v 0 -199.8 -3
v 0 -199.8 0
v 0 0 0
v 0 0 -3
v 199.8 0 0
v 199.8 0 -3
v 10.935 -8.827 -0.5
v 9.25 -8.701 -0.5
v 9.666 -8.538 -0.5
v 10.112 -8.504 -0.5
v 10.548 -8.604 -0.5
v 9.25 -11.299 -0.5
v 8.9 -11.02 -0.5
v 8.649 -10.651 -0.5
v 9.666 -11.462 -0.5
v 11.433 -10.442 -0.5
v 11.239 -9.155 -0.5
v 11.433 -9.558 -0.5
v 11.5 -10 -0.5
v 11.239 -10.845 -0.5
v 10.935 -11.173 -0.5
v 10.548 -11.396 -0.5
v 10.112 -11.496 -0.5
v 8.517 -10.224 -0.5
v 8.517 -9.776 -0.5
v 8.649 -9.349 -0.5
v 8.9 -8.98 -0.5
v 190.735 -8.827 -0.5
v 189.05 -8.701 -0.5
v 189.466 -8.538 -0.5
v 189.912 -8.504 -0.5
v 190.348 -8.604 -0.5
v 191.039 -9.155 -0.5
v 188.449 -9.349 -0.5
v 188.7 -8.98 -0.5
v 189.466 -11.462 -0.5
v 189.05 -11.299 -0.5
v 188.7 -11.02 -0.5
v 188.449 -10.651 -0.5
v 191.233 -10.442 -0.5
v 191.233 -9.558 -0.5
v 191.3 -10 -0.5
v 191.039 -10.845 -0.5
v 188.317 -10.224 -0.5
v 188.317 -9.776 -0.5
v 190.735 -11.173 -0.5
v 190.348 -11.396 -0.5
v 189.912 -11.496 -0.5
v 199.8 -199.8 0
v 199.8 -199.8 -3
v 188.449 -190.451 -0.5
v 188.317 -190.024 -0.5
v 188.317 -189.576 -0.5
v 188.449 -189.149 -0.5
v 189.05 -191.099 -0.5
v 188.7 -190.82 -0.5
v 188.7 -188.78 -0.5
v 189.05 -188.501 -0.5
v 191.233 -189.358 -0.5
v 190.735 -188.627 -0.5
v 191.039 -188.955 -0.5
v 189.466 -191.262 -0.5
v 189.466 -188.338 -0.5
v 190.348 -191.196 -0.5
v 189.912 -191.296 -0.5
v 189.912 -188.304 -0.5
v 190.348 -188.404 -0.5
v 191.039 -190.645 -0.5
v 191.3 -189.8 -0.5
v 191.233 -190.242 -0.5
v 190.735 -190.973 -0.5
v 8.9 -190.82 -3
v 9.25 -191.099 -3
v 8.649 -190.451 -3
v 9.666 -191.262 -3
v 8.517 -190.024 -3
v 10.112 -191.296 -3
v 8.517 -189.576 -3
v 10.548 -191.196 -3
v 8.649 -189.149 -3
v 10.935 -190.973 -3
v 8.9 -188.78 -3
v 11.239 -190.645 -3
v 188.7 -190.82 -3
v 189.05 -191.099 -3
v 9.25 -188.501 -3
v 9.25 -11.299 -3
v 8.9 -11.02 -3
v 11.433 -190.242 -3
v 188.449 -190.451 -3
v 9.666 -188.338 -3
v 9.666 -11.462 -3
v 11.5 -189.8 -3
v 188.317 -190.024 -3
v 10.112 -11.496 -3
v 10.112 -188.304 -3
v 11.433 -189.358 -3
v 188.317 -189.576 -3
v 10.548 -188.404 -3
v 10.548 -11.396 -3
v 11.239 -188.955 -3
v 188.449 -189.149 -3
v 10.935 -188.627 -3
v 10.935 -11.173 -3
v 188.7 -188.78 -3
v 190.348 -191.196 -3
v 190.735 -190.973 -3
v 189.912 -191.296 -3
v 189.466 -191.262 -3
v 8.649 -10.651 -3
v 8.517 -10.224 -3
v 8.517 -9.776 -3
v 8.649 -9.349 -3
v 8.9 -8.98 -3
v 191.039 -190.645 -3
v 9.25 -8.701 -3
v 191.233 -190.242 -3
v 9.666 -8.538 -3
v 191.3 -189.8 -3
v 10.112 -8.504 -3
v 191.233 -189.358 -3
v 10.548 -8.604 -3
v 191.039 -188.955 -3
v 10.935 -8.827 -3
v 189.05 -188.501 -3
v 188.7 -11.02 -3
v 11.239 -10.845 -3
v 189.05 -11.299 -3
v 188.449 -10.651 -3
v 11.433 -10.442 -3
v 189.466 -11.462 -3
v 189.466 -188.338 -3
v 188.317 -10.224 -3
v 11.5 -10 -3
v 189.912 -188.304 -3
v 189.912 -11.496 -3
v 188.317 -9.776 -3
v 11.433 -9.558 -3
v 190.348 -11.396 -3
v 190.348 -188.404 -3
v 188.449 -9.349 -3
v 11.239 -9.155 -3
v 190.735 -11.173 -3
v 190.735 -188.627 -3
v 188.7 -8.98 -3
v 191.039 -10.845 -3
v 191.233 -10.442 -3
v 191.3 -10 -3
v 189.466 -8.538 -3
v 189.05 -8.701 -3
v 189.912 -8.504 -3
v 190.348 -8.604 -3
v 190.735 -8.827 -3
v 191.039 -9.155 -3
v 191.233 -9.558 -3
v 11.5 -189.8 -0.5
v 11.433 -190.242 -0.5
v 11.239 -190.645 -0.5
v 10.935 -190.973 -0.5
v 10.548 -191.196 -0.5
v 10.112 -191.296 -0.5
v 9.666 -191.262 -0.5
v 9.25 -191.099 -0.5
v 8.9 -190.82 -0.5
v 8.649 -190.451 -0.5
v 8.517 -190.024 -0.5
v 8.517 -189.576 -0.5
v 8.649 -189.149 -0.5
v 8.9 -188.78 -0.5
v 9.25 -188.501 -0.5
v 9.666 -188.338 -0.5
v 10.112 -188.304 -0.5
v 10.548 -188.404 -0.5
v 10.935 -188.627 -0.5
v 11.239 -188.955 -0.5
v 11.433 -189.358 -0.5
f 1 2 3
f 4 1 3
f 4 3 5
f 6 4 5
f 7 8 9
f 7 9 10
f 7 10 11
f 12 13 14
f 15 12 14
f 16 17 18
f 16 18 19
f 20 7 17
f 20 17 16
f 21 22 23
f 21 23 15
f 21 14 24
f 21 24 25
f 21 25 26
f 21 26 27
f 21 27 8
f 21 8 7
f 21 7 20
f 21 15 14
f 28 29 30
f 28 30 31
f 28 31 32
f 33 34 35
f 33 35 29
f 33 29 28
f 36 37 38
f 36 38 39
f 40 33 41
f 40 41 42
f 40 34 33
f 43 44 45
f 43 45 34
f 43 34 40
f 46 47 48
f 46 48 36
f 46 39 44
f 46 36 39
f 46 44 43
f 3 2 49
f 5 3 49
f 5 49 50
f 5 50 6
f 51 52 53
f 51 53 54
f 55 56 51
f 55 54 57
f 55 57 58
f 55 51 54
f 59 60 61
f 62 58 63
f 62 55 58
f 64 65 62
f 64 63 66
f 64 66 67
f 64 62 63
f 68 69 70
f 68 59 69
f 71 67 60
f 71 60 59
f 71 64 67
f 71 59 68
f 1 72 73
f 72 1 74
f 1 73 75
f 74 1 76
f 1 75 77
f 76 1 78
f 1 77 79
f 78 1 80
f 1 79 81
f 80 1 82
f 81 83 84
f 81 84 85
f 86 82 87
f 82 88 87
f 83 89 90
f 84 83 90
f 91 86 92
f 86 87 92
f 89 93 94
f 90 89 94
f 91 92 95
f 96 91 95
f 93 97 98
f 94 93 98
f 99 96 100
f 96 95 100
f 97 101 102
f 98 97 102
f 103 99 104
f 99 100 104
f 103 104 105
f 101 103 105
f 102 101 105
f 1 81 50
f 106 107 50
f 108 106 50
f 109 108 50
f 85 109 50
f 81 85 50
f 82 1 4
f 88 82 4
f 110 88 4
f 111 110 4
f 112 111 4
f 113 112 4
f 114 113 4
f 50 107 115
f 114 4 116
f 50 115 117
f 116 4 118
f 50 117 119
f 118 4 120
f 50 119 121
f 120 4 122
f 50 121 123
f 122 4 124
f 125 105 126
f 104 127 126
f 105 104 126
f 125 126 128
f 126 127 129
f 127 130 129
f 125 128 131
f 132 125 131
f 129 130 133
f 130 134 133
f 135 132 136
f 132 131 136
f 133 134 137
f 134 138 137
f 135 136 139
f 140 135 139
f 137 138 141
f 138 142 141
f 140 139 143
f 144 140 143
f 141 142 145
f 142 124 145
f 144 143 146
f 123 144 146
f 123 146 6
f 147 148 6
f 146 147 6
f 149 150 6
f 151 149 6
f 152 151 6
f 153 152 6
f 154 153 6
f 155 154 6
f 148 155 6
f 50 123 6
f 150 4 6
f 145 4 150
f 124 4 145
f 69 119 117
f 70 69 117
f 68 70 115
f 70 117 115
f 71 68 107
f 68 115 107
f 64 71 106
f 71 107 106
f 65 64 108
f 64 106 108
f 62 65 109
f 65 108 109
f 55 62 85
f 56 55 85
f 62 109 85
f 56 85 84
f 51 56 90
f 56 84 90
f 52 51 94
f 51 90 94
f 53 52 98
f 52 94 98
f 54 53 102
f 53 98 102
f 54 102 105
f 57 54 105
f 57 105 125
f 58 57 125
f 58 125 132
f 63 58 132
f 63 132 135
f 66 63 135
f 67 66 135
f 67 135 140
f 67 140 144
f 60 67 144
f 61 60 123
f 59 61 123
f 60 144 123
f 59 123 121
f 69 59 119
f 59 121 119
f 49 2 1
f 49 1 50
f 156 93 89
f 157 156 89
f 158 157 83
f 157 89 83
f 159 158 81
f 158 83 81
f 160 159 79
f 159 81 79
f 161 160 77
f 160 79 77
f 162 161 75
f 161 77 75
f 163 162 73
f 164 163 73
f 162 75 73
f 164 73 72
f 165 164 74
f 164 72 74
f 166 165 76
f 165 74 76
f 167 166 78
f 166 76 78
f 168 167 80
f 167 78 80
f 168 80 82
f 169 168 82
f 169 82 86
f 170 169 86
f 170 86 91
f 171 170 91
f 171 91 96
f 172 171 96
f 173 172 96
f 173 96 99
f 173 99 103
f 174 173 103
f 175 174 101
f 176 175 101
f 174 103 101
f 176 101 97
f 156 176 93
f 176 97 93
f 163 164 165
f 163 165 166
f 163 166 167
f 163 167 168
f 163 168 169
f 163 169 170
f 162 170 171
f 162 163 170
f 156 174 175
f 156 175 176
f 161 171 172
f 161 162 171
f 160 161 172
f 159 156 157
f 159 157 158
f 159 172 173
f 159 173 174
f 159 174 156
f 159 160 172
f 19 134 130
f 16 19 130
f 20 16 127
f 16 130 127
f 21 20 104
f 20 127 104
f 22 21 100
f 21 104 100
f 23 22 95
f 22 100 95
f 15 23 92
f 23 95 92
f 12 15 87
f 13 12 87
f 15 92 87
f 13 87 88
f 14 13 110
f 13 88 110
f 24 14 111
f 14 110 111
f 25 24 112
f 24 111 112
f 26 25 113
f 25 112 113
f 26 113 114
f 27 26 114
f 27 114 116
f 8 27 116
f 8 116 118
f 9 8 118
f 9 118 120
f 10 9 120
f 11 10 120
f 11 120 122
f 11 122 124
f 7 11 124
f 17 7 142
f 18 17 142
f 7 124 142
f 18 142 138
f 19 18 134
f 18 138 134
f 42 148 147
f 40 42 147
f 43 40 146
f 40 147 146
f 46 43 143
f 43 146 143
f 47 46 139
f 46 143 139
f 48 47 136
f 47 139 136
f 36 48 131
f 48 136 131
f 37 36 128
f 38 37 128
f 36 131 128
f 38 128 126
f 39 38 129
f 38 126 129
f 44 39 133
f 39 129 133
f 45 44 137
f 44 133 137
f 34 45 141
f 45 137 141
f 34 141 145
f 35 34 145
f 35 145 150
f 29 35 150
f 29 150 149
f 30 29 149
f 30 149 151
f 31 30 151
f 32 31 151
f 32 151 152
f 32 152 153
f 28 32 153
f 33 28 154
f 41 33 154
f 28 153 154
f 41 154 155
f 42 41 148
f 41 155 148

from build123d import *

# Parameters (mm, degrees)
SKETCH_W     = 199.8
SKETCH_H     = 199.8
PAD_DEPTH    = 3
SKETCH001_R  = 1.5
POCKET_DEPTH = 2.5


with BuildPart() as part:
    # Sketch → Pad (new body)
    with BuildSketch(Plane.XY):
        with Locations((99.9, -99.9)):
            Rectangle(SKETCH_W, SKETCH_H)
    extrude(amount=-PAD_DEPTH)

    # Sketch001 (on Face6 of Pad) → Pocket (cut)
    with BuildSketch(Plane(origin=(0, 0, -3), x_dir=(1, 0, 0), z_dir=(0, 0, -1))):
        with Locations((10, 10)):
            Circle(SKETCH001_R)
        with Locations((189.8, 10)):
            Circle(SKETCH001_R)
        with Locations((10, 189.8)):
            Circle(SKETCH001_R)
        with Locations((189.8, 189.8)):
            Circle(SKETCH001_R)
    extrude(amount=-POCKET_DEPTH, mode=Mode.SUBTRACT)


solid = part.part
